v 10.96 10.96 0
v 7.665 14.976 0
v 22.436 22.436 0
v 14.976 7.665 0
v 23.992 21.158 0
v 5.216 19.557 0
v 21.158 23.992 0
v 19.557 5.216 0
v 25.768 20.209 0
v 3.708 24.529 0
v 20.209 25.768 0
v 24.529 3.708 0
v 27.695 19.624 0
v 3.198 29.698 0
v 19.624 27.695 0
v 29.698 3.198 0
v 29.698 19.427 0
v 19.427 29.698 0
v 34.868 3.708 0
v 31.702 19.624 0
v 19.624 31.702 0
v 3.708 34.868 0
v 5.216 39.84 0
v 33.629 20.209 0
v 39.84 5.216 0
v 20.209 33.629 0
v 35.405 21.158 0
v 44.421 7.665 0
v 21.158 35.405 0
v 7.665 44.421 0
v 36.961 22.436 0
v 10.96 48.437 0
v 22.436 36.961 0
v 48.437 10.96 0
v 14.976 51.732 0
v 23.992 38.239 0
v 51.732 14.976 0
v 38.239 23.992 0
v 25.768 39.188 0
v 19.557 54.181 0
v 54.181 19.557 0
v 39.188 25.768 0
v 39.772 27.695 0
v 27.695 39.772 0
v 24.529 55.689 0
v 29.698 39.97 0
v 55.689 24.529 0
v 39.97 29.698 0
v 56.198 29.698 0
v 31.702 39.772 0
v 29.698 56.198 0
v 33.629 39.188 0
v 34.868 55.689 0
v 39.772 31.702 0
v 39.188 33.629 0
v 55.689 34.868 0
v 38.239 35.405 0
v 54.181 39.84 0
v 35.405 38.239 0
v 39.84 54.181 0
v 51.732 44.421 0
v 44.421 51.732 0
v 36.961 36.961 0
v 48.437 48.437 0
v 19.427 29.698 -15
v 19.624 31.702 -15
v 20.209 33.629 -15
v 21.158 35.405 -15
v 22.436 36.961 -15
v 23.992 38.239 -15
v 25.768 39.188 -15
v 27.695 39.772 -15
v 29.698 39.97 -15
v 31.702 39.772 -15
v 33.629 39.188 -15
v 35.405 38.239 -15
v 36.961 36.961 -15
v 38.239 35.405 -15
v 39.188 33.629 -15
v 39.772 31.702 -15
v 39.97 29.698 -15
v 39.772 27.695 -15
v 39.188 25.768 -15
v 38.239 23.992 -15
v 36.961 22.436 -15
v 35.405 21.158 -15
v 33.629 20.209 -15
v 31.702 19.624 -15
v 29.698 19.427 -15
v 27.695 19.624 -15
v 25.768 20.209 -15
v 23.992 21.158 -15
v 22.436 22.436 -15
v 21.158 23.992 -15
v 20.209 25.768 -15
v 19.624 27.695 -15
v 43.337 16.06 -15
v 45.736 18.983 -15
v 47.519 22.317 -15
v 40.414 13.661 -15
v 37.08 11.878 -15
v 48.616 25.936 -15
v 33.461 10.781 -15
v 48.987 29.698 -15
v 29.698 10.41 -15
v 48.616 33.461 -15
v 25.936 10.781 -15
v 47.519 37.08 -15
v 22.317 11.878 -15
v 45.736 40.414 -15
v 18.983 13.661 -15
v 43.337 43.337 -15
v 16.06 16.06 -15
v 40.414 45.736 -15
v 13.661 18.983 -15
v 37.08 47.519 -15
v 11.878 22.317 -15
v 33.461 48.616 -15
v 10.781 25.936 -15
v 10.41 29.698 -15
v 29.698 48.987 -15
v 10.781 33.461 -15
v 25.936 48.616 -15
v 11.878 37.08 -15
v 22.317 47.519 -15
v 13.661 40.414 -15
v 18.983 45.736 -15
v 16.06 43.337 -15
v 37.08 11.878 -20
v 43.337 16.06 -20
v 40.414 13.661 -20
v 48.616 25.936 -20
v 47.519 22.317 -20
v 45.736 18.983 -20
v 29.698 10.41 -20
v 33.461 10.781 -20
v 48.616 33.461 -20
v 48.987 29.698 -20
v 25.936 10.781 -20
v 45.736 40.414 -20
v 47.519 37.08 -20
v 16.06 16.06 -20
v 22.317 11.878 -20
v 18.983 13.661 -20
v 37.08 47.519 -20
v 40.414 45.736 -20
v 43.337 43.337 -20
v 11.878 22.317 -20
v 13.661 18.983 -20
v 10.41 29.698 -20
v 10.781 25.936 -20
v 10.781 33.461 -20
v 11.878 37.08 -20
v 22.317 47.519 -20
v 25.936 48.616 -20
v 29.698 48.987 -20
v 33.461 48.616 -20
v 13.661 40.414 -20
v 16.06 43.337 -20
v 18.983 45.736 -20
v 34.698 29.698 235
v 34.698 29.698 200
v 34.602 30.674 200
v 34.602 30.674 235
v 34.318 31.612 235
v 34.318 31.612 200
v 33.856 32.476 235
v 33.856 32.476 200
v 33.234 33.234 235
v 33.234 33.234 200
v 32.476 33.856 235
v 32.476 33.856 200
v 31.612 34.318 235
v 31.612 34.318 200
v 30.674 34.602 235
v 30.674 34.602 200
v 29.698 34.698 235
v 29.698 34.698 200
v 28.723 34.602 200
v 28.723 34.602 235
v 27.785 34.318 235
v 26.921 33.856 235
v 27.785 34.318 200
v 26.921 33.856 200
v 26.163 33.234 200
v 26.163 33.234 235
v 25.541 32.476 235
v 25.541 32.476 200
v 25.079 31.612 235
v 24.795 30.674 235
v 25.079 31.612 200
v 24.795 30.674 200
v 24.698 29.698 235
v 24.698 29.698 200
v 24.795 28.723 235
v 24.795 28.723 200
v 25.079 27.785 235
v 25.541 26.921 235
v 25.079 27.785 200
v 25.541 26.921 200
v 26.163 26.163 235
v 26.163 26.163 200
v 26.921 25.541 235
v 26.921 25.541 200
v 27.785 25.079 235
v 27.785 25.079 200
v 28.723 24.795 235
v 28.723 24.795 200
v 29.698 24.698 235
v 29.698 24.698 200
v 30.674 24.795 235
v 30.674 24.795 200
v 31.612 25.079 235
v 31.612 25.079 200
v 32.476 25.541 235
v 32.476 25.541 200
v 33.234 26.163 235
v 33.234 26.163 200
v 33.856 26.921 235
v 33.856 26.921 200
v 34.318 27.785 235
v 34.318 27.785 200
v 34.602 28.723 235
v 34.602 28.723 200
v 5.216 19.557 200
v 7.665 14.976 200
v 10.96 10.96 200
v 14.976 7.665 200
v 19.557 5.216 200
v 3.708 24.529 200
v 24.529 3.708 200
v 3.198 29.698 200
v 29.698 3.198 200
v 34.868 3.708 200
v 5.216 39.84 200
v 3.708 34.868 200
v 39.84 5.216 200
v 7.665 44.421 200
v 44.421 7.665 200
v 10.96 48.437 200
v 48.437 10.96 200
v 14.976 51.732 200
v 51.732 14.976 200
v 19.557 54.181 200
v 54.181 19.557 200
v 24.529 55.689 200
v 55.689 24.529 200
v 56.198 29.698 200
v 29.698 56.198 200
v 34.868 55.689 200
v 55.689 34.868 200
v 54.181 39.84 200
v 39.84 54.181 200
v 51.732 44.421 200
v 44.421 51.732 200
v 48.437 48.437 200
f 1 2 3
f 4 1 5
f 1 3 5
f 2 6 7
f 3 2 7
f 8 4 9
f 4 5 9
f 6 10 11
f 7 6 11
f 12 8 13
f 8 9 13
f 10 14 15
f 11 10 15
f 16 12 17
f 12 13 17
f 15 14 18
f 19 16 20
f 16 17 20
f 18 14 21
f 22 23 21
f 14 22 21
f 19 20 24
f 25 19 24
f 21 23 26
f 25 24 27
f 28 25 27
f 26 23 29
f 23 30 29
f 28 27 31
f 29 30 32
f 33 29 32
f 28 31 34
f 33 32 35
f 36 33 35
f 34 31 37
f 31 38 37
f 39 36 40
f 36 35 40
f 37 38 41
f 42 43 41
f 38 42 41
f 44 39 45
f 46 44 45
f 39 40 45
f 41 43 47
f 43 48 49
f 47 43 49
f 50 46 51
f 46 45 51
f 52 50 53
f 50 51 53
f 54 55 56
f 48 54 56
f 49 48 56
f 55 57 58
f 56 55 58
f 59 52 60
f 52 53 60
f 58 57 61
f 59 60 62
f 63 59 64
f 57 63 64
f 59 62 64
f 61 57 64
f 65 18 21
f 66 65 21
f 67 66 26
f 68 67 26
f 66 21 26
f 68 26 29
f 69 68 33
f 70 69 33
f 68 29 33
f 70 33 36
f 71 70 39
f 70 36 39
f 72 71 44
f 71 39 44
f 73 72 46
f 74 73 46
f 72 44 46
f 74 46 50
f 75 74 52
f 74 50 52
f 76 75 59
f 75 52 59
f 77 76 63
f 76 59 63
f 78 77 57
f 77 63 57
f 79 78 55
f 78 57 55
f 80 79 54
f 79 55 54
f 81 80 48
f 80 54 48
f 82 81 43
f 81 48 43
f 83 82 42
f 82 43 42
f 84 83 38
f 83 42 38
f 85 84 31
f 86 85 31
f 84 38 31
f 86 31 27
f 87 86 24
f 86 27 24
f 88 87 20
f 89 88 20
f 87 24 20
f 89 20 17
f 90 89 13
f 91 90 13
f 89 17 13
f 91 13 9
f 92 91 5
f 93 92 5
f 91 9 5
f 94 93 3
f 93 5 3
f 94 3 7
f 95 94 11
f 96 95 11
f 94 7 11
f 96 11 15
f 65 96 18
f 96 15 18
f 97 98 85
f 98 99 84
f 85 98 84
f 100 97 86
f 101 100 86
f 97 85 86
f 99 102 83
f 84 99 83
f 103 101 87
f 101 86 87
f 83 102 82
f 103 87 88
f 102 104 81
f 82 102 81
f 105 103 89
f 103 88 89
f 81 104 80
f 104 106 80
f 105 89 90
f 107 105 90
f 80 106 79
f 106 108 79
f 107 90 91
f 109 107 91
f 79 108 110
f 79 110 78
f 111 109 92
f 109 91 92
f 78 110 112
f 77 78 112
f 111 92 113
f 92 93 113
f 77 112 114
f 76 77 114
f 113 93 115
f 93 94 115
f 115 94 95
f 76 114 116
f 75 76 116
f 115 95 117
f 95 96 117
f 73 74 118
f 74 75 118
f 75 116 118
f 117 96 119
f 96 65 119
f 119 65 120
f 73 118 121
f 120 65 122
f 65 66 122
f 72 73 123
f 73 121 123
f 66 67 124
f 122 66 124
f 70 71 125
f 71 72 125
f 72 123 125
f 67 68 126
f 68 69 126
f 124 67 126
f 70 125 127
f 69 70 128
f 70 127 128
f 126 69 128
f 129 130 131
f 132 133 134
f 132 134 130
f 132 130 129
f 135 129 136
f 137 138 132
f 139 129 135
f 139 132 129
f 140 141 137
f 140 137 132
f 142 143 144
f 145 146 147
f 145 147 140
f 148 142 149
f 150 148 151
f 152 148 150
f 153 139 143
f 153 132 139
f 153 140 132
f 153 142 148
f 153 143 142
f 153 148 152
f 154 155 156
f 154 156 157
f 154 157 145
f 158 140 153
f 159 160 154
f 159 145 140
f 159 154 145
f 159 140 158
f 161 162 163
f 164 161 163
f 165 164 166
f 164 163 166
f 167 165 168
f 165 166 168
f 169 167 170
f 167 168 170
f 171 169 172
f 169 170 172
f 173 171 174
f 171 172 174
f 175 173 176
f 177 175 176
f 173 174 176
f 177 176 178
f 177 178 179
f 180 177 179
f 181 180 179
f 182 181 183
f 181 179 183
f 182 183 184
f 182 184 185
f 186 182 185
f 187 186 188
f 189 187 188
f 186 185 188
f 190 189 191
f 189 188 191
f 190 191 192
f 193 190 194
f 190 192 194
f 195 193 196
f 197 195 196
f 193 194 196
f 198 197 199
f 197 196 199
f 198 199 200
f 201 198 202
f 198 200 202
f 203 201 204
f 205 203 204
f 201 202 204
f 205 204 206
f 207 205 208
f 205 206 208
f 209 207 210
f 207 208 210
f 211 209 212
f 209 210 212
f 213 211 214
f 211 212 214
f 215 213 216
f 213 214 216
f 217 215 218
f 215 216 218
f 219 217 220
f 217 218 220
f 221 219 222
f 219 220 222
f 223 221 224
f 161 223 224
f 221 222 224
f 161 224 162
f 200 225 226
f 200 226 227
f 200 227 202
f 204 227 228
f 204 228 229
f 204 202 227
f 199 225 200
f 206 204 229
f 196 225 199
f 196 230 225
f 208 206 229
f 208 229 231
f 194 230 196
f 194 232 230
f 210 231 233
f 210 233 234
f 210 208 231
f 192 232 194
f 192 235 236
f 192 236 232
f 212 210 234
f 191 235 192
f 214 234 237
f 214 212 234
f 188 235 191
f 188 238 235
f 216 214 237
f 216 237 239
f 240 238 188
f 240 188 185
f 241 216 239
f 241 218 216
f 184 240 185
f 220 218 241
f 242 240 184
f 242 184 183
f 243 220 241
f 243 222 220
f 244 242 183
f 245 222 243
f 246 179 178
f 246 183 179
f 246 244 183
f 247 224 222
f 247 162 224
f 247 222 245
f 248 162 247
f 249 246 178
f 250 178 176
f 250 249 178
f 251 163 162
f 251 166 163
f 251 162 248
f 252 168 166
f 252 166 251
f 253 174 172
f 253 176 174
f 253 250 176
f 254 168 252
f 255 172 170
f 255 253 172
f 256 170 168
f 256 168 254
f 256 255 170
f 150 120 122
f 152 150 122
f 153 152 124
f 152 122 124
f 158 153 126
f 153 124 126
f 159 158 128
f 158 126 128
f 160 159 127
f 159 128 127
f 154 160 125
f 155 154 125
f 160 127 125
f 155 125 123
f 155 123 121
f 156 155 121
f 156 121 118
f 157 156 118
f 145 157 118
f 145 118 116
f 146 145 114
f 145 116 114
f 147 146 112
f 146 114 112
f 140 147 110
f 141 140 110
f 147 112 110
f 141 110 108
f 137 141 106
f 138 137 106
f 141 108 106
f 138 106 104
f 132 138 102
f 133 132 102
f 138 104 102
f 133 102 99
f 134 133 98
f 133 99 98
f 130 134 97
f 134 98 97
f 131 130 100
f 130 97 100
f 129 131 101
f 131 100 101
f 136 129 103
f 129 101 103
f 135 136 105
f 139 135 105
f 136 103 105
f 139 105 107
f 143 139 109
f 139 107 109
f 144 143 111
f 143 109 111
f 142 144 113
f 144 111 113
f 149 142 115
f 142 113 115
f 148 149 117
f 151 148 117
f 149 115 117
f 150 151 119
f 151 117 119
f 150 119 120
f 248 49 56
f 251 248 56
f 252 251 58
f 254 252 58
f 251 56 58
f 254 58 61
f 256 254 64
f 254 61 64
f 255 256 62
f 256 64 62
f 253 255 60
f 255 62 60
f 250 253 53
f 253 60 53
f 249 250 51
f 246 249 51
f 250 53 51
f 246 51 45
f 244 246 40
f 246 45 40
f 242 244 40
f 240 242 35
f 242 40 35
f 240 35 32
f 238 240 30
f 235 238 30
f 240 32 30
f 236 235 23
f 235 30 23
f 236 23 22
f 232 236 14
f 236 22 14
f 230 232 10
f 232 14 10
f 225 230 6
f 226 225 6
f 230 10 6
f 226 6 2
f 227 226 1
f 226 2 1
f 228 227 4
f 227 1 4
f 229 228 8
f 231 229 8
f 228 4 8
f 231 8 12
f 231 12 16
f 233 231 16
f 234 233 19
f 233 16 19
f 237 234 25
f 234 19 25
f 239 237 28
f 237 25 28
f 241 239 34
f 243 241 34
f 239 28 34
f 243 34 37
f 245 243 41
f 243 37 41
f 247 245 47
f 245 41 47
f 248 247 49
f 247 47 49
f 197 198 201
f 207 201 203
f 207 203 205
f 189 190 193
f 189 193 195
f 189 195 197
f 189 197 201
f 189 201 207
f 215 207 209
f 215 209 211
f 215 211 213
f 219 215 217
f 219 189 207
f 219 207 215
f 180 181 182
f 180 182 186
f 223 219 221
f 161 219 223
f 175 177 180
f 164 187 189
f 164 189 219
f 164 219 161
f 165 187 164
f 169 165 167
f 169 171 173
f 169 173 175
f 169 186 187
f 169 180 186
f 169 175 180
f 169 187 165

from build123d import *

# Parameters (mm, degrees)
SKETCH2_R           = 26.5
BOSS_EXTRUDE1_DEPTH = 200
SKETCH3_R           = 5
BOSS_EXTRUDE2_DEPTH = 35
SKETCH4_R           = 10.271360286
BOSS_EXTRUDE3_DEPTH = 15
SKETCH5_R           = 19.288260132
BOSS_EXTRUDE4_DEPTH = 5


with BuildPart() as part:
    # Sketch2 → Boss-Extrude1 (new body)
    with BuildSketch(Plane.XY):
        with Locations((29.69848481, 29.69848481)):
            Circle(SKETCH2_R)
    extrude(amount=BOSS_EXTRUDE1_DEPTH)

    # Sketch3 → Boss-Extrude2 (add)
    with BuildSketch(Plane.XY.offset(200)):
        with Locations((29.69848481, 29.69848481)):
            Circle(SKETCH3_R)
    extrude(amount=BOSS_EXTRUDE2_DEPTH)

    # Sketch4 → Boss-Extrude3 (add)
    with BuildSketch(Plane(origin=(0, 0, 0), x_dir=(-1, 0, 0), z_dir=(0, 0, -1))):
        with Locations((-29.69848481, 29.69848481)):
            Circle(SKETCH4_R)
    extrude(amount=BOSS_EXTRUDE3_DEPTH)

    # Sketch5 → Boss-Extrude4 (add)
    with BuildSketch(Plane(origin=(0, 0, -15), x_dir=(-1, 0, 0), z_dir=(0, 0, -1))):
        with Locations((-29.69848481, 29.69848481)):
            Circle(SKETCH5_R)
    extrude(amount=BOSS_EXTRUDE4_DEPTH)


solid = part.part
